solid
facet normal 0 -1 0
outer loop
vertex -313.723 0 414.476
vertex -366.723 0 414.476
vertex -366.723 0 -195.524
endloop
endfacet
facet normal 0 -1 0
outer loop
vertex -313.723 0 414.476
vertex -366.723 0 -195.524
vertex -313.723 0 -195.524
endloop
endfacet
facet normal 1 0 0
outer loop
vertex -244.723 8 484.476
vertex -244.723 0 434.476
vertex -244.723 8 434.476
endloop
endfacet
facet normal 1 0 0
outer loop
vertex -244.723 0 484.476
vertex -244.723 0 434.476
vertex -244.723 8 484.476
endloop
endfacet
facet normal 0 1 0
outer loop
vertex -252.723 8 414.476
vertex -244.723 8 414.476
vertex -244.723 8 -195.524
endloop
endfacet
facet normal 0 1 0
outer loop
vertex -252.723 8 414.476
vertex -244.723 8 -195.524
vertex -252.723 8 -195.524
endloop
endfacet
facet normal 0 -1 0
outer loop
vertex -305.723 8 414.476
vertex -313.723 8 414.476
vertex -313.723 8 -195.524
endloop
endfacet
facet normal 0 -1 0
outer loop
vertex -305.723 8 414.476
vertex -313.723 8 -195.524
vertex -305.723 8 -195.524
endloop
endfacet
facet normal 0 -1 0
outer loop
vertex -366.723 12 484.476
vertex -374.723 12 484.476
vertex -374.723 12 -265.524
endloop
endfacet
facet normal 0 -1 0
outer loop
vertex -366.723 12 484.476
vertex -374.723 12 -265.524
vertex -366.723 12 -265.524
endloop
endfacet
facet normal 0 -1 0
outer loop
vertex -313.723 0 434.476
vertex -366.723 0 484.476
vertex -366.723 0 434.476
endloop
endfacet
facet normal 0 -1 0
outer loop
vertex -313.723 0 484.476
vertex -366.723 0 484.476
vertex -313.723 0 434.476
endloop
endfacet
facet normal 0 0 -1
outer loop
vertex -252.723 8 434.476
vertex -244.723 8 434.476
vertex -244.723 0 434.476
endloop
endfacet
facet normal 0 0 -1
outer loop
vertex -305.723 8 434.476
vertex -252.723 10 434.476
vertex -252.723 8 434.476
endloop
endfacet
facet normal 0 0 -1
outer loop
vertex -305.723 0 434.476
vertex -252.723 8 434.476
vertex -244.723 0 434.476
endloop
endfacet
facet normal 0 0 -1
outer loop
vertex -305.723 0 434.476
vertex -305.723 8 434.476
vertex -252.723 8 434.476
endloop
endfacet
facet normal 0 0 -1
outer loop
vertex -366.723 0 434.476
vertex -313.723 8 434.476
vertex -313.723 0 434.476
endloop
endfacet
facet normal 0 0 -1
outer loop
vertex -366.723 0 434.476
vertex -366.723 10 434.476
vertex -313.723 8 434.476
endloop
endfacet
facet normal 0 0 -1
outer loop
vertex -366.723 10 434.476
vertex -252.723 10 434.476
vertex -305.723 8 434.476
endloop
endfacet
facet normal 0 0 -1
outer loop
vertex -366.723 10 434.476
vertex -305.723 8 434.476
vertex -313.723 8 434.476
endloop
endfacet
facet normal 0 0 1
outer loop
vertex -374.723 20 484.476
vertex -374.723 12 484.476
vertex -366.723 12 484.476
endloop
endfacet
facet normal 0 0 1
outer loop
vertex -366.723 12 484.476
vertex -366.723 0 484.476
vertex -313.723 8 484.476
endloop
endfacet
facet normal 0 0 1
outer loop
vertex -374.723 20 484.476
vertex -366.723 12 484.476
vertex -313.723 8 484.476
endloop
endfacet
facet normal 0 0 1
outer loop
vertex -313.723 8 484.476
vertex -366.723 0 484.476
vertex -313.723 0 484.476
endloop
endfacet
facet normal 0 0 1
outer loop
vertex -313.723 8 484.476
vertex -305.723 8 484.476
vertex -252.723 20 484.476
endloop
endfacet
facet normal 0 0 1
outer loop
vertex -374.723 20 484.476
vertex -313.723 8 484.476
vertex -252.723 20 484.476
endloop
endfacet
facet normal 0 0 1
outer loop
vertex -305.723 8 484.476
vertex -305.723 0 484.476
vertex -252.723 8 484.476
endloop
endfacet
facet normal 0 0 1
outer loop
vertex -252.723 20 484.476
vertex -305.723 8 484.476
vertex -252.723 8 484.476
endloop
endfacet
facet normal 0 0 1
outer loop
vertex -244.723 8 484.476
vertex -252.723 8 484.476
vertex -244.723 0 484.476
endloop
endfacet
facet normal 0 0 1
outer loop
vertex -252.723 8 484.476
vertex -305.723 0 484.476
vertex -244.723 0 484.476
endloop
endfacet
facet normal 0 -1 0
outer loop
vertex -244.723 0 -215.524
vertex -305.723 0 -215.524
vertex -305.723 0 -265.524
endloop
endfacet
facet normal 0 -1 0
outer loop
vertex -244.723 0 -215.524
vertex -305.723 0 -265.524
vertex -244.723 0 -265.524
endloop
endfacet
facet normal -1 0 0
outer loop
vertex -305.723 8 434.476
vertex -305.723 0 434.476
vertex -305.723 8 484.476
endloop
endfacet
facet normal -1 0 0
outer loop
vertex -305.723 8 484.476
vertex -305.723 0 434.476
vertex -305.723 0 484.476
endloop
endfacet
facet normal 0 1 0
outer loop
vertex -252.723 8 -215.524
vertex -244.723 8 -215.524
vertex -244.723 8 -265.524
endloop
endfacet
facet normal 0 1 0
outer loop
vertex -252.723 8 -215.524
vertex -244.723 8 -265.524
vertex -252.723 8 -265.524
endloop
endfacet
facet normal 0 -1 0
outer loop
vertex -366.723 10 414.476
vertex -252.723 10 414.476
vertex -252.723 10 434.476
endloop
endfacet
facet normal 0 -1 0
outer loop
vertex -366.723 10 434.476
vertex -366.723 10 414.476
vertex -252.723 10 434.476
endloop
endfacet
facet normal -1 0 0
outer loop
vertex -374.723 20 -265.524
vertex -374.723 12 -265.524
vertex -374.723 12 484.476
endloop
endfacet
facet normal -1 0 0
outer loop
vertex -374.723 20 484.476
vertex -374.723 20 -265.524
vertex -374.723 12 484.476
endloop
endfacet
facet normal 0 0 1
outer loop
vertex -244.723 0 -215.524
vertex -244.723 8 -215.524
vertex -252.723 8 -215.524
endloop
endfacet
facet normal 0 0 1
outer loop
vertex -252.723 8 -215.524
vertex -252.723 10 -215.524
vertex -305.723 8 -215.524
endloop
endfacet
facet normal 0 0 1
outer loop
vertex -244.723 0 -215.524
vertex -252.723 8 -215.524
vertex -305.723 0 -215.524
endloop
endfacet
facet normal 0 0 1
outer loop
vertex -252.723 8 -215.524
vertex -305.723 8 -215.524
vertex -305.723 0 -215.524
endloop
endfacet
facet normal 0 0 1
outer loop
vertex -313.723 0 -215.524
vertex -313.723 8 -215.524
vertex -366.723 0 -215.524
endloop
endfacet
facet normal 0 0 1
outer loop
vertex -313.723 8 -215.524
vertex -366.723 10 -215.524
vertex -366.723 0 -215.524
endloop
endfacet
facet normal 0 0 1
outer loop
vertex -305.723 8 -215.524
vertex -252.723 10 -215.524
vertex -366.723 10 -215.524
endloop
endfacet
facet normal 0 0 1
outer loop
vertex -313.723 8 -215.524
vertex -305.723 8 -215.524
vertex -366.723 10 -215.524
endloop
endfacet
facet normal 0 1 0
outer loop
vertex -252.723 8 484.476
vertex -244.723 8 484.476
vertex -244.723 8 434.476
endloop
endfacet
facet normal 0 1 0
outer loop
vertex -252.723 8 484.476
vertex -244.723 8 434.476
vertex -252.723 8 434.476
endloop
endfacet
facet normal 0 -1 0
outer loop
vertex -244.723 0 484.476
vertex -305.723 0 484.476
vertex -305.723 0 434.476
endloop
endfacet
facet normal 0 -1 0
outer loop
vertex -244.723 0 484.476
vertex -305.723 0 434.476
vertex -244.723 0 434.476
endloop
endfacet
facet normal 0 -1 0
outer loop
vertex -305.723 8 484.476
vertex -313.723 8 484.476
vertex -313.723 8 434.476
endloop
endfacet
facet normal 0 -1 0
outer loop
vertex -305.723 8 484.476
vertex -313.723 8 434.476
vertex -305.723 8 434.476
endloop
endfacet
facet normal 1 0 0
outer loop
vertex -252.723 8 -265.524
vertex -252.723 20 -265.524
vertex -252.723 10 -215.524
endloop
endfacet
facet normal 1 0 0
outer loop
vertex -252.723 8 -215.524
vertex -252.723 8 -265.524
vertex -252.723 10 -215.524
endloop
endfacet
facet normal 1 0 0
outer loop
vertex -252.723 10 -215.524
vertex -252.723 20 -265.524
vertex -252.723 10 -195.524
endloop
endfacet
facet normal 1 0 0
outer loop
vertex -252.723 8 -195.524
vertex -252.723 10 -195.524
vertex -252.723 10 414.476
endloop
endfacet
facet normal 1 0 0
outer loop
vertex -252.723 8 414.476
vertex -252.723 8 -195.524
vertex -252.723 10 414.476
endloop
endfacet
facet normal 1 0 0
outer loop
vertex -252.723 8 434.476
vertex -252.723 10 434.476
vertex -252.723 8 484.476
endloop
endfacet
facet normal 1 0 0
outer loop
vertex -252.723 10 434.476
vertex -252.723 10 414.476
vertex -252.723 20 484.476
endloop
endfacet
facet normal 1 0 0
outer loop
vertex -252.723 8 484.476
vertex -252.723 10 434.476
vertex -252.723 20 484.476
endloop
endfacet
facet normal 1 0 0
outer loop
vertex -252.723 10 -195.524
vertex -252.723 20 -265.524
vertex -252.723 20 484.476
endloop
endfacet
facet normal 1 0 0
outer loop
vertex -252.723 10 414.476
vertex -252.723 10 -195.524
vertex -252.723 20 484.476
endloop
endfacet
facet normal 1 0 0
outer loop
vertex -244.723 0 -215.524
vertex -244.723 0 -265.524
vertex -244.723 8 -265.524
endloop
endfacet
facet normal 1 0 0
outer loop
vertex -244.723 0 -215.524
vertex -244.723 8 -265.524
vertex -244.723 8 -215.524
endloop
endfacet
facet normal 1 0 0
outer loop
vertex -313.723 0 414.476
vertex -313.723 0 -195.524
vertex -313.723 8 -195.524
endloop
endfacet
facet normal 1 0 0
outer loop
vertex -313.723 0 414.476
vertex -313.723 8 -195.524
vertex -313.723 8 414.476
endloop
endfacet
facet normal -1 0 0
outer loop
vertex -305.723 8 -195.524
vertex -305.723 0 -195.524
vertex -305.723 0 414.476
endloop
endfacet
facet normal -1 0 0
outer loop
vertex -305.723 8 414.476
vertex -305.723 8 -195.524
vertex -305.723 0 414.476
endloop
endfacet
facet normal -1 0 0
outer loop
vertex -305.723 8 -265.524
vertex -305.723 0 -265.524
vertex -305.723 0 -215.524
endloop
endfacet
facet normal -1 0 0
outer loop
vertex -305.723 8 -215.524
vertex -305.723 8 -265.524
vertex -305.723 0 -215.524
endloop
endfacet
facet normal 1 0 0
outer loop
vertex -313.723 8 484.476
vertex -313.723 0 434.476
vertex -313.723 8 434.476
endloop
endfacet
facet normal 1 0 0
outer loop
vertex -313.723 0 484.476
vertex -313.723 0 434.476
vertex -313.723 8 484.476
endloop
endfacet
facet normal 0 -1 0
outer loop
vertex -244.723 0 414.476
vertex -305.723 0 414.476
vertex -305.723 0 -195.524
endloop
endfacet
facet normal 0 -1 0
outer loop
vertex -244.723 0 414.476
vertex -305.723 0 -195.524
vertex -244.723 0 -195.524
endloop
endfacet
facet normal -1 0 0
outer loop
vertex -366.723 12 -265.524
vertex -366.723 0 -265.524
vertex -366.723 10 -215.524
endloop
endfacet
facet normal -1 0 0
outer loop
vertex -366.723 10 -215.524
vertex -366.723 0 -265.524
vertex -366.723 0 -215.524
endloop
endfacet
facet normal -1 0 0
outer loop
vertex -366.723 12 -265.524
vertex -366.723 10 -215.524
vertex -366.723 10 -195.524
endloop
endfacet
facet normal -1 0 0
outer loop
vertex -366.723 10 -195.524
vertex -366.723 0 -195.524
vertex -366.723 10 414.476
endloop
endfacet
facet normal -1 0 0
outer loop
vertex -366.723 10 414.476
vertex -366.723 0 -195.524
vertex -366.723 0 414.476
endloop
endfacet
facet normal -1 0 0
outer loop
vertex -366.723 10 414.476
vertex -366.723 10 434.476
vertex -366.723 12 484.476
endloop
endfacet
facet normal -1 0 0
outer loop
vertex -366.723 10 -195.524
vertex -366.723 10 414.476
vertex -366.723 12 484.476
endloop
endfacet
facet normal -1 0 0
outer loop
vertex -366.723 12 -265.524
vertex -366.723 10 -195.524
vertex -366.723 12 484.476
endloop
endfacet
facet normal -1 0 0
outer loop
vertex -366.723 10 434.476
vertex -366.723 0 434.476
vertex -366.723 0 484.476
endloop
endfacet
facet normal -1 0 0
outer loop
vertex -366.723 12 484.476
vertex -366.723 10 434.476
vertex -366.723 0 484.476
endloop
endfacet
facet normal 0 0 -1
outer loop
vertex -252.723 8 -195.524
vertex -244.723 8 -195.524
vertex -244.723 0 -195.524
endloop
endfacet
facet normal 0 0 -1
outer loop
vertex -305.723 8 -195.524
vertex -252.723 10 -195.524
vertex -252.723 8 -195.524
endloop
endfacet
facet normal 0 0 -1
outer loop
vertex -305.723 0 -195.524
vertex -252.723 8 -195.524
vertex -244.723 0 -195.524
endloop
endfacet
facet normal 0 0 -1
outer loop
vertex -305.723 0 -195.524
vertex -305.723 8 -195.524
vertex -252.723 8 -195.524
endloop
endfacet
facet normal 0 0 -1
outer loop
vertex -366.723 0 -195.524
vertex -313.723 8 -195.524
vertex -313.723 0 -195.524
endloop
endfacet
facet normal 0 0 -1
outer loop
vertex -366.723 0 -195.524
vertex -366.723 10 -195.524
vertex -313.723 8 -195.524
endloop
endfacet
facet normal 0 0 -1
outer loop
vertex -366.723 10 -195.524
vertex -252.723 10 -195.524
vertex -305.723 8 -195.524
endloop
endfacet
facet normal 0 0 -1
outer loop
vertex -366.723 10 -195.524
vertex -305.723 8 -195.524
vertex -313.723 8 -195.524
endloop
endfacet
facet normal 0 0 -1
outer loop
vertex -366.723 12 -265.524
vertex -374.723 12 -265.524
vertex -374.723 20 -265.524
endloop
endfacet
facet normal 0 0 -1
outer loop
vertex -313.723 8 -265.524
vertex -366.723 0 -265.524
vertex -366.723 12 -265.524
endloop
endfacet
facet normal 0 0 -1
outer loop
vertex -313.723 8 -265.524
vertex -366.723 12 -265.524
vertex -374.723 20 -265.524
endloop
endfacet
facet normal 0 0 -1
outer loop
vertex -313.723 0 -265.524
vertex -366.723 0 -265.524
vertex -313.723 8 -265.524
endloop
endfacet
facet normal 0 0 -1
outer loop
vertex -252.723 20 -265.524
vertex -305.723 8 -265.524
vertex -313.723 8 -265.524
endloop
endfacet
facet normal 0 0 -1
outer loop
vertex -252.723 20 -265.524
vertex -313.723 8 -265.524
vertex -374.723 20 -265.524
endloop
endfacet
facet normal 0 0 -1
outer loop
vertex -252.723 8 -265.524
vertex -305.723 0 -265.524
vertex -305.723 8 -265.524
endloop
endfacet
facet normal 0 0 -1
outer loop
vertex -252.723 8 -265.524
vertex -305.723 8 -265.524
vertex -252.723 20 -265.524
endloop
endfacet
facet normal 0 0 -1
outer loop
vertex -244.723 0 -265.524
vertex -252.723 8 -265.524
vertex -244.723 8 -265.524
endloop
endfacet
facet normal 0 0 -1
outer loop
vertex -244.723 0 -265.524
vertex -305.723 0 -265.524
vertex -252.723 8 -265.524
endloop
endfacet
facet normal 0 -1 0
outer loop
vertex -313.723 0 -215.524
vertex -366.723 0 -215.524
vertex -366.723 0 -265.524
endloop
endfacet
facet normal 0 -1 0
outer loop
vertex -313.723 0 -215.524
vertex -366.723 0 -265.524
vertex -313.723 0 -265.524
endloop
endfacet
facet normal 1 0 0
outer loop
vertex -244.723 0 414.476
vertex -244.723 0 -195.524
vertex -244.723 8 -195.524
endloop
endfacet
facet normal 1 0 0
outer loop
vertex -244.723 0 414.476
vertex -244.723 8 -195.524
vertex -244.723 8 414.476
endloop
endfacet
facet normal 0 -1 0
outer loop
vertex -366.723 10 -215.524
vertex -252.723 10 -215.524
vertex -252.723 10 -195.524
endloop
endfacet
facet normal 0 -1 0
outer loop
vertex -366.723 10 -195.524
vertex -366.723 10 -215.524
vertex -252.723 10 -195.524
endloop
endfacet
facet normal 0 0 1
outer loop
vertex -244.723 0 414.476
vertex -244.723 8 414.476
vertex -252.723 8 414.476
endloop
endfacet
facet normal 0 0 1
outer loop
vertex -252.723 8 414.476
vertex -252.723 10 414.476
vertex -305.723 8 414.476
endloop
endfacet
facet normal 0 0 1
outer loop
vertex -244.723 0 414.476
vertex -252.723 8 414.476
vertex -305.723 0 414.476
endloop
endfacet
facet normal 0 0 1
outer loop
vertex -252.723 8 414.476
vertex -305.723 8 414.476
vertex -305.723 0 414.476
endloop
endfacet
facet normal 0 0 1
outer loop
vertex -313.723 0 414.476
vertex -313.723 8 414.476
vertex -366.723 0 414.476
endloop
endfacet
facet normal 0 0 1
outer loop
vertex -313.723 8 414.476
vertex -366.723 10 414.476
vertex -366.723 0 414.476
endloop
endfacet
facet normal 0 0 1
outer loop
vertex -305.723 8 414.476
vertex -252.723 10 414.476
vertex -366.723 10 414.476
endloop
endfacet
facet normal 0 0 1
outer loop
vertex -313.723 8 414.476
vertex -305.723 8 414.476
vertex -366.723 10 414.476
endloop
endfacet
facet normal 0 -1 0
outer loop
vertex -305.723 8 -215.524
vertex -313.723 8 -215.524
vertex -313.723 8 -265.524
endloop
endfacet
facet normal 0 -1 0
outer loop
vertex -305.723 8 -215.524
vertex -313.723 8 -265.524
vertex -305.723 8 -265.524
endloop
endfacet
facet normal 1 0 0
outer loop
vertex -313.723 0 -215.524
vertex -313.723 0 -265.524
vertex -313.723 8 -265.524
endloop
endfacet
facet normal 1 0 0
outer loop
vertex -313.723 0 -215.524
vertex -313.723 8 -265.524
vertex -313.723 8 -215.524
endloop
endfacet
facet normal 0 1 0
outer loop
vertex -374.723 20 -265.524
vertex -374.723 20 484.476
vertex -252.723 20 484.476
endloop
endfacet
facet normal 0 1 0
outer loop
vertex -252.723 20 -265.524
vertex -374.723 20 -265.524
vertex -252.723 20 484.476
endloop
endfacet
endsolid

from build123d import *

# Parameters (mm, degrees)
F0_W     = 130
F0_H     = 750
F1_DEPTH = 20
F2_W     = 8
F2_H     = 750
F3_DEPTH = 8
F4_W     = 8
F4_H     = 1460
F5_DEPTH = 12
F6_W     = 8
F6_H     = 750
F7_DEPTH = 12
F8_W     = 10
F8_H     = 20
F9_DEPTH = 130


with BuildPart() as f1:
    # F0 (on Front) → F1 (new body)
    with BuildSketch(Plane.XZ):
        with Locations((-309.722924, 109.476302)):
            Rectangle(F0_W, F0_H)
    extrude(amount=-F1_DEPTH)

    # F2 (on face) → F3 (cut)
    with BuildSketch(Plane.XZ):
        with Locations((-309.722924, 109.476302)):
            Rectangle(F2_W, F2_H)
    extrude(amount=-F3_DEPTH, mode=Mode.SUBTRACT)

    # F4 (on face) → F5 (cut)
    with BuildSketch(Plane.XZ):
        with Locations((-370.722924, -245.523698)):
            Rectangle(F4_W, F4_H)
    extrude(amount=-F5_DEPTH, mode=Mode.SUBTRACT)

    # F6 (on face) → F7 (cut)
    with BuildSketch(Plane(origin=(0, 20, 0), x_dir=(-1, 0, 0), z_dir=(0, 1, 0))):
        with Locations((248.722924, 109.476302)):
            Rectangle(F6_W, F6_H)
    extrude(amount=-F7_DEPTH, mode=Mode.SUBTRACT)

    # F8 (on face) → F9 (cut)
    with BuildSketch(Plane(origin=(-366.722924, 0, 0), x_dir=(0, -1, 0), z_dir=(-1, 0, 0))):
        with Locations((-5, -205.523698)):
            Rectangle(F8_W, F8_H)
        with Locations((-5, 424.476302)):
            Rectangle(F8_W, F8_H)
    extrude(amount=-F9_DEPTH, mode=Mode.SUBTRACT)


solid = f1.part
